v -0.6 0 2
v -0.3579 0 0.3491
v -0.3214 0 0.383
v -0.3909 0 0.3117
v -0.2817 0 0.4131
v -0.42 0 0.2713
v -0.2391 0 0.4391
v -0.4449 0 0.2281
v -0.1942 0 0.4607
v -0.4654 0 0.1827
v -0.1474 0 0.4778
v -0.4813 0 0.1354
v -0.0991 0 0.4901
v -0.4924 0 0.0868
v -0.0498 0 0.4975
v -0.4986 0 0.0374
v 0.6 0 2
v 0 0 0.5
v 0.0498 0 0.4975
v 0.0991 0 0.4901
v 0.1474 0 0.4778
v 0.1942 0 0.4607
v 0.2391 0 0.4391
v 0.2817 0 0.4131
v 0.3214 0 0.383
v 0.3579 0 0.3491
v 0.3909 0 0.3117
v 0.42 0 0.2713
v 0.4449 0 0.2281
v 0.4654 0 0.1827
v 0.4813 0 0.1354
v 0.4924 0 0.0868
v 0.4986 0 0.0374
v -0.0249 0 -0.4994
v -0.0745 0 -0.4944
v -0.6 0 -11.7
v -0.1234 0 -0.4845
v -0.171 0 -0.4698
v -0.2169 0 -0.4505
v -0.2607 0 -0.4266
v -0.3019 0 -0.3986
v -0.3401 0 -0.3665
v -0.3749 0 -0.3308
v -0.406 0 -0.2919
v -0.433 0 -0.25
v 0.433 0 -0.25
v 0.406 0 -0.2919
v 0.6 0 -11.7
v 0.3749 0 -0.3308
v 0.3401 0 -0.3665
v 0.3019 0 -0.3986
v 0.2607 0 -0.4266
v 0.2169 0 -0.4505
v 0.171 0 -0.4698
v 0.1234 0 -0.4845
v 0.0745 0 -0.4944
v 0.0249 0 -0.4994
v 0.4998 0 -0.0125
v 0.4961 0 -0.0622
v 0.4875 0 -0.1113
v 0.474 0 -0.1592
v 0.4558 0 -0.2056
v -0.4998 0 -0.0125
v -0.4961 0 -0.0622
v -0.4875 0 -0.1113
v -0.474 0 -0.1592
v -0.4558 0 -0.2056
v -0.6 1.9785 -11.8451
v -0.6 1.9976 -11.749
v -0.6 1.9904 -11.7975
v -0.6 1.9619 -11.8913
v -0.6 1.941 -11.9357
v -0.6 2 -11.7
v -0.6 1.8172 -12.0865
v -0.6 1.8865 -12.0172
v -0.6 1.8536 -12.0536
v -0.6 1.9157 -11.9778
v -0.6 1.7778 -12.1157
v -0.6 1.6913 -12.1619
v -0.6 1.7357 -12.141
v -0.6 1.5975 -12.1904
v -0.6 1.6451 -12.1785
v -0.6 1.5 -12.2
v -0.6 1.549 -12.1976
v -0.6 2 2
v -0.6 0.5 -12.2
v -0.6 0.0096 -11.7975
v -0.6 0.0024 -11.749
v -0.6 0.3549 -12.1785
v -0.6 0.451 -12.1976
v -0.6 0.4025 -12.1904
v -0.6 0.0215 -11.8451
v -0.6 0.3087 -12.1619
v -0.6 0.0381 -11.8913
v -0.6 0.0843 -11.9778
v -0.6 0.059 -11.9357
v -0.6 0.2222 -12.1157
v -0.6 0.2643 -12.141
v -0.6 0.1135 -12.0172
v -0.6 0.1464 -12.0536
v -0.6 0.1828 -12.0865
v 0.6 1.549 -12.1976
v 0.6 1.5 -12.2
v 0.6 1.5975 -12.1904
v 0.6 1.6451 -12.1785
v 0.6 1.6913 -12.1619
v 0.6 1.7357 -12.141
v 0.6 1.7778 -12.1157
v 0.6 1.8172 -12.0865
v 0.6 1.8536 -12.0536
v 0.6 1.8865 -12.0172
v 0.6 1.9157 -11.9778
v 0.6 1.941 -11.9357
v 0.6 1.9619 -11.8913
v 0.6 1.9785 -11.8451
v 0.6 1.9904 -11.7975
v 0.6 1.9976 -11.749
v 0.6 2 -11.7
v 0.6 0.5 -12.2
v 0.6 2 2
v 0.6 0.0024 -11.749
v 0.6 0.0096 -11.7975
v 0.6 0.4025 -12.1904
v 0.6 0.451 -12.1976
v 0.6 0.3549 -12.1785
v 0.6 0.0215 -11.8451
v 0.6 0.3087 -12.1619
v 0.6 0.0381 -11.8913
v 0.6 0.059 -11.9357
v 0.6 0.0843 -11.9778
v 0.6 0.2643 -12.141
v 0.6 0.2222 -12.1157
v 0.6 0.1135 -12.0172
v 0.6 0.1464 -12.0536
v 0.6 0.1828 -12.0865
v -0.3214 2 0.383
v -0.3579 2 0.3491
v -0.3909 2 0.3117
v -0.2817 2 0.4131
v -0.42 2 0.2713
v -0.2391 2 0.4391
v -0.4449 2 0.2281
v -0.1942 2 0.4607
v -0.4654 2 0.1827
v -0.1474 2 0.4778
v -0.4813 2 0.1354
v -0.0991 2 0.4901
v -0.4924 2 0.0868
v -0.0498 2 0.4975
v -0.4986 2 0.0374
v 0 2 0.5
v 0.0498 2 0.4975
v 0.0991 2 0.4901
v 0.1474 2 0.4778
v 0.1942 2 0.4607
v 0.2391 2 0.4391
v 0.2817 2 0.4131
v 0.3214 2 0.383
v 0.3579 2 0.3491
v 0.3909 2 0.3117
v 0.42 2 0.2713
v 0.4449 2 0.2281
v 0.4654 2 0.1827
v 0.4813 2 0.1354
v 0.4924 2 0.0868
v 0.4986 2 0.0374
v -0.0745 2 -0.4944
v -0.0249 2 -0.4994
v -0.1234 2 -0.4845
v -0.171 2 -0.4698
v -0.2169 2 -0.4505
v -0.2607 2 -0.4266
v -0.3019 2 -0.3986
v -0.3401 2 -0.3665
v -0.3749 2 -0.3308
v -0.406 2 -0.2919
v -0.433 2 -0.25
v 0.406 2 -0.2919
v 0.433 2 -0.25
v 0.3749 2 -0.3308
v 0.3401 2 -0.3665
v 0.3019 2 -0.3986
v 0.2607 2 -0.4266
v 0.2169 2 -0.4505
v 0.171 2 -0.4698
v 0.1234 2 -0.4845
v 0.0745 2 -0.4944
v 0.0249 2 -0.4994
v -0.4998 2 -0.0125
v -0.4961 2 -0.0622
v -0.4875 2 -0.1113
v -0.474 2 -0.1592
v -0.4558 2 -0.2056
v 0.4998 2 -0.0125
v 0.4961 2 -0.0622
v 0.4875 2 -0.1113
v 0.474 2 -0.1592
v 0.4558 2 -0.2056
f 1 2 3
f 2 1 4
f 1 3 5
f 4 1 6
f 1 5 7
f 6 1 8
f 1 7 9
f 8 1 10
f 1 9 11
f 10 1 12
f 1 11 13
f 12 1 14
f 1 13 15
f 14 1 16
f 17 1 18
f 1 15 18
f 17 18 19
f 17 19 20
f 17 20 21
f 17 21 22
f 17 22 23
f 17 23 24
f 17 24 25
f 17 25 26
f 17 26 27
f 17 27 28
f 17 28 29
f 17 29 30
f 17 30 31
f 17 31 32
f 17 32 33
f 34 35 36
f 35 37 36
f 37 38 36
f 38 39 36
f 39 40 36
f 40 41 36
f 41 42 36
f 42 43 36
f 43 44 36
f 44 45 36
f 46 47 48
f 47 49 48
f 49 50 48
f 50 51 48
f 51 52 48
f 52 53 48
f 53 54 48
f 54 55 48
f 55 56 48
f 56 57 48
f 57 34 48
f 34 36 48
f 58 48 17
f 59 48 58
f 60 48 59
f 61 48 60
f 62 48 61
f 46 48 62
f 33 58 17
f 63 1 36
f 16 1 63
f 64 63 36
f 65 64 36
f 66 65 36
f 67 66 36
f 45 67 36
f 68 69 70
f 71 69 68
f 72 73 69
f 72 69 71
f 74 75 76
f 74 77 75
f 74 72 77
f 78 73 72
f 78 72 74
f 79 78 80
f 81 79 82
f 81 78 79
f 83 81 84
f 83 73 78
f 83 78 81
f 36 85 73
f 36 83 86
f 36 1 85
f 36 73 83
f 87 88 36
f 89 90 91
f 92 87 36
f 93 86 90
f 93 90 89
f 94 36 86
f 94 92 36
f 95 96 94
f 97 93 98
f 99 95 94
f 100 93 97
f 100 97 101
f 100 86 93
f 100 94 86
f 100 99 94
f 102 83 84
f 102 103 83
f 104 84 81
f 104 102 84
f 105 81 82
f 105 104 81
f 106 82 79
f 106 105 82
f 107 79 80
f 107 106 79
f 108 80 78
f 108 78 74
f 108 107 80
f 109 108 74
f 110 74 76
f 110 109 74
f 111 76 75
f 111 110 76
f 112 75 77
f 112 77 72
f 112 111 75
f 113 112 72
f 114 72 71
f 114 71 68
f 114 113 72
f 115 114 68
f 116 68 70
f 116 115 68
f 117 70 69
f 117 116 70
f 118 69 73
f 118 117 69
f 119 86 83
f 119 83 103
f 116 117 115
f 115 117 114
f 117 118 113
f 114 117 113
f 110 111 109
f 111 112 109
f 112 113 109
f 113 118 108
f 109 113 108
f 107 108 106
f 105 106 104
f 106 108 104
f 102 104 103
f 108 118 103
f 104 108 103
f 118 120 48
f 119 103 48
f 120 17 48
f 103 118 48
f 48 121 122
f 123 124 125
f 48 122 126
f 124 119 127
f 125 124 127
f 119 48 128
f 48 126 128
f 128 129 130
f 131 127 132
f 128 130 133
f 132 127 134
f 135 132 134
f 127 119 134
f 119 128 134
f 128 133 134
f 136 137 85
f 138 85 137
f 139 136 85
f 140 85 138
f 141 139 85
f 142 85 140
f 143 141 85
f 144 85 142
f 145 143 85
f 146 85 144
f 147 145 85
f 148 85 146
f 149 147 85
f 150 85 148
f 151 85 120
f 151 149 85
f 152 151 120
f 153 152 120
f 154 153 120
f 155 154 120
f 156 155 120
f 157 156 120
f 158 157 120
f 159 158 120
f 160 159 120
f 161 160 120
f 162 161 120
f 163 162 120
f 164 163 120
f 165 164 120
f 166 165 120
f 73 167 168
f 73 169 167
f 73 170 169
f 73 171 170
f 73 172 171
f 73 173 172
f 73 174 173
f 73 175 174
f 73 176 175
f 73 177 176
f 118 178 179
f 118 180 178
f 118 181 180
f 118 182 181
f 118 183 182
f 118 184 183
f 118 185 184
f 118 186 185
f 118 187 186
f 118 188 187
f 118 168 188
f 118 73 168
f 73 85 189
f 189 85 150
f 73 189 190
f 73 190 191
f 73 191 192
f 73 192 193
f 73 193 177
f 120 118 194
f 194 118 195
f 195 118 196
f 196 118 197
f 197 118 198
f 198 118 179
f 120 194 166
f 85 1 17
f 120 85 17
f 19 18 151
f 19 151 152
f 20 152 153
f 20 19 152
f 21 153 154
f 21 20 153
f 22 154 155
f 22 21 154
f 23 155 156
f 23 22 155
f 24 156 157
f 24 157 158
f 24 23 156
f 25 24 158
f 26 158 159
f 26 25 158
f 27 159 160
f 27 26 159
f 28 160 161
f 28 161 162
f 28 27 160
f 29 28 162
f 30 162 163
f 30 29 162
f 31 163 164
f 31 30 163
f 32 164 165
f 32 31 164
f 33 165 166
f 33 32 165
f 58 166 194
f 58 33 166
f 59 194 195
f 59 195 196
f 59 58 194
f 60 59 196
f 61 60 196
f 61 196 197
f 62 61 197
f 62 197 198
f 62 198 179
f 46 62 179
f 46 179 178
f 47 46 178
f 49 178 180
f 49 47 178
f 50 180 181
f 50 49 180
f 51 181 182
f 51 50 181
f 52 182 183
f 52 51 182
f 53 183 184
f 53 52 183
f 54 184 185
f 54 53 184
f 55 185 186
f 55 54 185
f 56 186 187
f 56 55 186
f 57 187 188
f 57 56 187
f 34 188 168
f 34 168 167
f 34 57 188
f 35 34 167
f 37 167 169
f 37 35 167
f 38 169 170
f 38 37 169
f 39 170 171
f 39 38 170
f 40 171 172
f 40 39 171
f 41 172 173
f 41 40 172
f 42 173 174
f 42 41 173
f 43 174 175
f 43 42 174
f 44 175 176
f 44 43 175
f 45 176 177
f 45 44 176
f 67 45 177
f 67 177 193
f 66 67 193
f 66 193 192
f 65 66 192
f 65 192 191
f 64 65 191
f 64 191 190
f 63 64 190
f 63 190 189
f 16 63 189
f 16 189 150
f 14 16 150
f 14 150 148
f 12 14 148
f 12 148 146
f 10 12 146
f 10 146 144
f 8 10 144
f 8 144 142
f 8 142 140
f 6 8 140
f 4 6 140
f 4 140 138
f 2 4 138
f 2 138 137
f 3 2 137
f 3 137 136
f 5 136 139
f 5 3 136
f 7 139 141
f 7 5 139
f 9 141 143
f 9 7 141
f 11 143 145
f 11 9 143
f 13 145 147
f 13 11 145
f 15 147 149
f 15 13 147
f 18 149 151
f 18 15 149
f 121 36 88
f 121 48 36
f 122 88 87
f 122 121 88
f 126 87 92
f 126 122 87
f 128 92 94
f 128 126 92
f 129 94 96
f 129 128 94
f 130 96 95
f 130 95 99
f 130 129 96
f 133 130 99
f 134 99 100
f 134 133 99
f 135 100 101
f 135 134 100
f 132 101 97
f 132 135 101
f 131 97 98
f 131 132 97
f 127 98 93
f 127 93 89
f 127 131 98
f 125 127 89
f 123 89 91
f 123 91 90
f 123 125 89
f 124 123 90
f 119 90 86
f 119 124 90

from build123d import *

# Parameters (mm, degrees)
SKETCH_1_W      = 1.2
SKETCH_1_H      = 7.2
SKETCH_1_H_2    = 7
SKETCH_1_R      = 0.5
EXTRUDE_1_DEPTH = 2
FILLET_1_R      = 0.5


with BuildPart() as part:
    # 草图1 → 凸台-拉伸1 (new body)
    # profile 1 of 2: a face of its own
    with BuildSketch(Plane(origin=(0, 0, 0), x_dir=(1, 0, 0), z_dir=(0, 1, 0))):
        with Locations((0, 8.6)):
            Rectangle(SKETCH_1_W, SKETCH_1_H)
    # profile 2 of 2: a face of its own
    with BuildSketch(Plane(origin=(0, 0, 0), x_dir=(1, 0, 0), z_dir=(0, 1, 0))):
        with Locations((0, 1.5)):
            Rectangle(SKETCH_1_W, SKETCH_1_H_2)
        with Locations(Location((0, 0, 0), (0, 0, 270))):
            Circle(SKETCH_1_R, mode=Mode.SUBTRACT)
    extrude(amount=EXTRUDE_1_DEPTH)

    # 圆角1
    fillet_1_edges = [part.edges().sort_by_distance(p)[0] for p in [
        (0, 2, -12.2),
        (0, 0, -12.2),
    ]]
    fillet(fillet_1_edges, radius=FILLET_1_R)


solid = part.part
